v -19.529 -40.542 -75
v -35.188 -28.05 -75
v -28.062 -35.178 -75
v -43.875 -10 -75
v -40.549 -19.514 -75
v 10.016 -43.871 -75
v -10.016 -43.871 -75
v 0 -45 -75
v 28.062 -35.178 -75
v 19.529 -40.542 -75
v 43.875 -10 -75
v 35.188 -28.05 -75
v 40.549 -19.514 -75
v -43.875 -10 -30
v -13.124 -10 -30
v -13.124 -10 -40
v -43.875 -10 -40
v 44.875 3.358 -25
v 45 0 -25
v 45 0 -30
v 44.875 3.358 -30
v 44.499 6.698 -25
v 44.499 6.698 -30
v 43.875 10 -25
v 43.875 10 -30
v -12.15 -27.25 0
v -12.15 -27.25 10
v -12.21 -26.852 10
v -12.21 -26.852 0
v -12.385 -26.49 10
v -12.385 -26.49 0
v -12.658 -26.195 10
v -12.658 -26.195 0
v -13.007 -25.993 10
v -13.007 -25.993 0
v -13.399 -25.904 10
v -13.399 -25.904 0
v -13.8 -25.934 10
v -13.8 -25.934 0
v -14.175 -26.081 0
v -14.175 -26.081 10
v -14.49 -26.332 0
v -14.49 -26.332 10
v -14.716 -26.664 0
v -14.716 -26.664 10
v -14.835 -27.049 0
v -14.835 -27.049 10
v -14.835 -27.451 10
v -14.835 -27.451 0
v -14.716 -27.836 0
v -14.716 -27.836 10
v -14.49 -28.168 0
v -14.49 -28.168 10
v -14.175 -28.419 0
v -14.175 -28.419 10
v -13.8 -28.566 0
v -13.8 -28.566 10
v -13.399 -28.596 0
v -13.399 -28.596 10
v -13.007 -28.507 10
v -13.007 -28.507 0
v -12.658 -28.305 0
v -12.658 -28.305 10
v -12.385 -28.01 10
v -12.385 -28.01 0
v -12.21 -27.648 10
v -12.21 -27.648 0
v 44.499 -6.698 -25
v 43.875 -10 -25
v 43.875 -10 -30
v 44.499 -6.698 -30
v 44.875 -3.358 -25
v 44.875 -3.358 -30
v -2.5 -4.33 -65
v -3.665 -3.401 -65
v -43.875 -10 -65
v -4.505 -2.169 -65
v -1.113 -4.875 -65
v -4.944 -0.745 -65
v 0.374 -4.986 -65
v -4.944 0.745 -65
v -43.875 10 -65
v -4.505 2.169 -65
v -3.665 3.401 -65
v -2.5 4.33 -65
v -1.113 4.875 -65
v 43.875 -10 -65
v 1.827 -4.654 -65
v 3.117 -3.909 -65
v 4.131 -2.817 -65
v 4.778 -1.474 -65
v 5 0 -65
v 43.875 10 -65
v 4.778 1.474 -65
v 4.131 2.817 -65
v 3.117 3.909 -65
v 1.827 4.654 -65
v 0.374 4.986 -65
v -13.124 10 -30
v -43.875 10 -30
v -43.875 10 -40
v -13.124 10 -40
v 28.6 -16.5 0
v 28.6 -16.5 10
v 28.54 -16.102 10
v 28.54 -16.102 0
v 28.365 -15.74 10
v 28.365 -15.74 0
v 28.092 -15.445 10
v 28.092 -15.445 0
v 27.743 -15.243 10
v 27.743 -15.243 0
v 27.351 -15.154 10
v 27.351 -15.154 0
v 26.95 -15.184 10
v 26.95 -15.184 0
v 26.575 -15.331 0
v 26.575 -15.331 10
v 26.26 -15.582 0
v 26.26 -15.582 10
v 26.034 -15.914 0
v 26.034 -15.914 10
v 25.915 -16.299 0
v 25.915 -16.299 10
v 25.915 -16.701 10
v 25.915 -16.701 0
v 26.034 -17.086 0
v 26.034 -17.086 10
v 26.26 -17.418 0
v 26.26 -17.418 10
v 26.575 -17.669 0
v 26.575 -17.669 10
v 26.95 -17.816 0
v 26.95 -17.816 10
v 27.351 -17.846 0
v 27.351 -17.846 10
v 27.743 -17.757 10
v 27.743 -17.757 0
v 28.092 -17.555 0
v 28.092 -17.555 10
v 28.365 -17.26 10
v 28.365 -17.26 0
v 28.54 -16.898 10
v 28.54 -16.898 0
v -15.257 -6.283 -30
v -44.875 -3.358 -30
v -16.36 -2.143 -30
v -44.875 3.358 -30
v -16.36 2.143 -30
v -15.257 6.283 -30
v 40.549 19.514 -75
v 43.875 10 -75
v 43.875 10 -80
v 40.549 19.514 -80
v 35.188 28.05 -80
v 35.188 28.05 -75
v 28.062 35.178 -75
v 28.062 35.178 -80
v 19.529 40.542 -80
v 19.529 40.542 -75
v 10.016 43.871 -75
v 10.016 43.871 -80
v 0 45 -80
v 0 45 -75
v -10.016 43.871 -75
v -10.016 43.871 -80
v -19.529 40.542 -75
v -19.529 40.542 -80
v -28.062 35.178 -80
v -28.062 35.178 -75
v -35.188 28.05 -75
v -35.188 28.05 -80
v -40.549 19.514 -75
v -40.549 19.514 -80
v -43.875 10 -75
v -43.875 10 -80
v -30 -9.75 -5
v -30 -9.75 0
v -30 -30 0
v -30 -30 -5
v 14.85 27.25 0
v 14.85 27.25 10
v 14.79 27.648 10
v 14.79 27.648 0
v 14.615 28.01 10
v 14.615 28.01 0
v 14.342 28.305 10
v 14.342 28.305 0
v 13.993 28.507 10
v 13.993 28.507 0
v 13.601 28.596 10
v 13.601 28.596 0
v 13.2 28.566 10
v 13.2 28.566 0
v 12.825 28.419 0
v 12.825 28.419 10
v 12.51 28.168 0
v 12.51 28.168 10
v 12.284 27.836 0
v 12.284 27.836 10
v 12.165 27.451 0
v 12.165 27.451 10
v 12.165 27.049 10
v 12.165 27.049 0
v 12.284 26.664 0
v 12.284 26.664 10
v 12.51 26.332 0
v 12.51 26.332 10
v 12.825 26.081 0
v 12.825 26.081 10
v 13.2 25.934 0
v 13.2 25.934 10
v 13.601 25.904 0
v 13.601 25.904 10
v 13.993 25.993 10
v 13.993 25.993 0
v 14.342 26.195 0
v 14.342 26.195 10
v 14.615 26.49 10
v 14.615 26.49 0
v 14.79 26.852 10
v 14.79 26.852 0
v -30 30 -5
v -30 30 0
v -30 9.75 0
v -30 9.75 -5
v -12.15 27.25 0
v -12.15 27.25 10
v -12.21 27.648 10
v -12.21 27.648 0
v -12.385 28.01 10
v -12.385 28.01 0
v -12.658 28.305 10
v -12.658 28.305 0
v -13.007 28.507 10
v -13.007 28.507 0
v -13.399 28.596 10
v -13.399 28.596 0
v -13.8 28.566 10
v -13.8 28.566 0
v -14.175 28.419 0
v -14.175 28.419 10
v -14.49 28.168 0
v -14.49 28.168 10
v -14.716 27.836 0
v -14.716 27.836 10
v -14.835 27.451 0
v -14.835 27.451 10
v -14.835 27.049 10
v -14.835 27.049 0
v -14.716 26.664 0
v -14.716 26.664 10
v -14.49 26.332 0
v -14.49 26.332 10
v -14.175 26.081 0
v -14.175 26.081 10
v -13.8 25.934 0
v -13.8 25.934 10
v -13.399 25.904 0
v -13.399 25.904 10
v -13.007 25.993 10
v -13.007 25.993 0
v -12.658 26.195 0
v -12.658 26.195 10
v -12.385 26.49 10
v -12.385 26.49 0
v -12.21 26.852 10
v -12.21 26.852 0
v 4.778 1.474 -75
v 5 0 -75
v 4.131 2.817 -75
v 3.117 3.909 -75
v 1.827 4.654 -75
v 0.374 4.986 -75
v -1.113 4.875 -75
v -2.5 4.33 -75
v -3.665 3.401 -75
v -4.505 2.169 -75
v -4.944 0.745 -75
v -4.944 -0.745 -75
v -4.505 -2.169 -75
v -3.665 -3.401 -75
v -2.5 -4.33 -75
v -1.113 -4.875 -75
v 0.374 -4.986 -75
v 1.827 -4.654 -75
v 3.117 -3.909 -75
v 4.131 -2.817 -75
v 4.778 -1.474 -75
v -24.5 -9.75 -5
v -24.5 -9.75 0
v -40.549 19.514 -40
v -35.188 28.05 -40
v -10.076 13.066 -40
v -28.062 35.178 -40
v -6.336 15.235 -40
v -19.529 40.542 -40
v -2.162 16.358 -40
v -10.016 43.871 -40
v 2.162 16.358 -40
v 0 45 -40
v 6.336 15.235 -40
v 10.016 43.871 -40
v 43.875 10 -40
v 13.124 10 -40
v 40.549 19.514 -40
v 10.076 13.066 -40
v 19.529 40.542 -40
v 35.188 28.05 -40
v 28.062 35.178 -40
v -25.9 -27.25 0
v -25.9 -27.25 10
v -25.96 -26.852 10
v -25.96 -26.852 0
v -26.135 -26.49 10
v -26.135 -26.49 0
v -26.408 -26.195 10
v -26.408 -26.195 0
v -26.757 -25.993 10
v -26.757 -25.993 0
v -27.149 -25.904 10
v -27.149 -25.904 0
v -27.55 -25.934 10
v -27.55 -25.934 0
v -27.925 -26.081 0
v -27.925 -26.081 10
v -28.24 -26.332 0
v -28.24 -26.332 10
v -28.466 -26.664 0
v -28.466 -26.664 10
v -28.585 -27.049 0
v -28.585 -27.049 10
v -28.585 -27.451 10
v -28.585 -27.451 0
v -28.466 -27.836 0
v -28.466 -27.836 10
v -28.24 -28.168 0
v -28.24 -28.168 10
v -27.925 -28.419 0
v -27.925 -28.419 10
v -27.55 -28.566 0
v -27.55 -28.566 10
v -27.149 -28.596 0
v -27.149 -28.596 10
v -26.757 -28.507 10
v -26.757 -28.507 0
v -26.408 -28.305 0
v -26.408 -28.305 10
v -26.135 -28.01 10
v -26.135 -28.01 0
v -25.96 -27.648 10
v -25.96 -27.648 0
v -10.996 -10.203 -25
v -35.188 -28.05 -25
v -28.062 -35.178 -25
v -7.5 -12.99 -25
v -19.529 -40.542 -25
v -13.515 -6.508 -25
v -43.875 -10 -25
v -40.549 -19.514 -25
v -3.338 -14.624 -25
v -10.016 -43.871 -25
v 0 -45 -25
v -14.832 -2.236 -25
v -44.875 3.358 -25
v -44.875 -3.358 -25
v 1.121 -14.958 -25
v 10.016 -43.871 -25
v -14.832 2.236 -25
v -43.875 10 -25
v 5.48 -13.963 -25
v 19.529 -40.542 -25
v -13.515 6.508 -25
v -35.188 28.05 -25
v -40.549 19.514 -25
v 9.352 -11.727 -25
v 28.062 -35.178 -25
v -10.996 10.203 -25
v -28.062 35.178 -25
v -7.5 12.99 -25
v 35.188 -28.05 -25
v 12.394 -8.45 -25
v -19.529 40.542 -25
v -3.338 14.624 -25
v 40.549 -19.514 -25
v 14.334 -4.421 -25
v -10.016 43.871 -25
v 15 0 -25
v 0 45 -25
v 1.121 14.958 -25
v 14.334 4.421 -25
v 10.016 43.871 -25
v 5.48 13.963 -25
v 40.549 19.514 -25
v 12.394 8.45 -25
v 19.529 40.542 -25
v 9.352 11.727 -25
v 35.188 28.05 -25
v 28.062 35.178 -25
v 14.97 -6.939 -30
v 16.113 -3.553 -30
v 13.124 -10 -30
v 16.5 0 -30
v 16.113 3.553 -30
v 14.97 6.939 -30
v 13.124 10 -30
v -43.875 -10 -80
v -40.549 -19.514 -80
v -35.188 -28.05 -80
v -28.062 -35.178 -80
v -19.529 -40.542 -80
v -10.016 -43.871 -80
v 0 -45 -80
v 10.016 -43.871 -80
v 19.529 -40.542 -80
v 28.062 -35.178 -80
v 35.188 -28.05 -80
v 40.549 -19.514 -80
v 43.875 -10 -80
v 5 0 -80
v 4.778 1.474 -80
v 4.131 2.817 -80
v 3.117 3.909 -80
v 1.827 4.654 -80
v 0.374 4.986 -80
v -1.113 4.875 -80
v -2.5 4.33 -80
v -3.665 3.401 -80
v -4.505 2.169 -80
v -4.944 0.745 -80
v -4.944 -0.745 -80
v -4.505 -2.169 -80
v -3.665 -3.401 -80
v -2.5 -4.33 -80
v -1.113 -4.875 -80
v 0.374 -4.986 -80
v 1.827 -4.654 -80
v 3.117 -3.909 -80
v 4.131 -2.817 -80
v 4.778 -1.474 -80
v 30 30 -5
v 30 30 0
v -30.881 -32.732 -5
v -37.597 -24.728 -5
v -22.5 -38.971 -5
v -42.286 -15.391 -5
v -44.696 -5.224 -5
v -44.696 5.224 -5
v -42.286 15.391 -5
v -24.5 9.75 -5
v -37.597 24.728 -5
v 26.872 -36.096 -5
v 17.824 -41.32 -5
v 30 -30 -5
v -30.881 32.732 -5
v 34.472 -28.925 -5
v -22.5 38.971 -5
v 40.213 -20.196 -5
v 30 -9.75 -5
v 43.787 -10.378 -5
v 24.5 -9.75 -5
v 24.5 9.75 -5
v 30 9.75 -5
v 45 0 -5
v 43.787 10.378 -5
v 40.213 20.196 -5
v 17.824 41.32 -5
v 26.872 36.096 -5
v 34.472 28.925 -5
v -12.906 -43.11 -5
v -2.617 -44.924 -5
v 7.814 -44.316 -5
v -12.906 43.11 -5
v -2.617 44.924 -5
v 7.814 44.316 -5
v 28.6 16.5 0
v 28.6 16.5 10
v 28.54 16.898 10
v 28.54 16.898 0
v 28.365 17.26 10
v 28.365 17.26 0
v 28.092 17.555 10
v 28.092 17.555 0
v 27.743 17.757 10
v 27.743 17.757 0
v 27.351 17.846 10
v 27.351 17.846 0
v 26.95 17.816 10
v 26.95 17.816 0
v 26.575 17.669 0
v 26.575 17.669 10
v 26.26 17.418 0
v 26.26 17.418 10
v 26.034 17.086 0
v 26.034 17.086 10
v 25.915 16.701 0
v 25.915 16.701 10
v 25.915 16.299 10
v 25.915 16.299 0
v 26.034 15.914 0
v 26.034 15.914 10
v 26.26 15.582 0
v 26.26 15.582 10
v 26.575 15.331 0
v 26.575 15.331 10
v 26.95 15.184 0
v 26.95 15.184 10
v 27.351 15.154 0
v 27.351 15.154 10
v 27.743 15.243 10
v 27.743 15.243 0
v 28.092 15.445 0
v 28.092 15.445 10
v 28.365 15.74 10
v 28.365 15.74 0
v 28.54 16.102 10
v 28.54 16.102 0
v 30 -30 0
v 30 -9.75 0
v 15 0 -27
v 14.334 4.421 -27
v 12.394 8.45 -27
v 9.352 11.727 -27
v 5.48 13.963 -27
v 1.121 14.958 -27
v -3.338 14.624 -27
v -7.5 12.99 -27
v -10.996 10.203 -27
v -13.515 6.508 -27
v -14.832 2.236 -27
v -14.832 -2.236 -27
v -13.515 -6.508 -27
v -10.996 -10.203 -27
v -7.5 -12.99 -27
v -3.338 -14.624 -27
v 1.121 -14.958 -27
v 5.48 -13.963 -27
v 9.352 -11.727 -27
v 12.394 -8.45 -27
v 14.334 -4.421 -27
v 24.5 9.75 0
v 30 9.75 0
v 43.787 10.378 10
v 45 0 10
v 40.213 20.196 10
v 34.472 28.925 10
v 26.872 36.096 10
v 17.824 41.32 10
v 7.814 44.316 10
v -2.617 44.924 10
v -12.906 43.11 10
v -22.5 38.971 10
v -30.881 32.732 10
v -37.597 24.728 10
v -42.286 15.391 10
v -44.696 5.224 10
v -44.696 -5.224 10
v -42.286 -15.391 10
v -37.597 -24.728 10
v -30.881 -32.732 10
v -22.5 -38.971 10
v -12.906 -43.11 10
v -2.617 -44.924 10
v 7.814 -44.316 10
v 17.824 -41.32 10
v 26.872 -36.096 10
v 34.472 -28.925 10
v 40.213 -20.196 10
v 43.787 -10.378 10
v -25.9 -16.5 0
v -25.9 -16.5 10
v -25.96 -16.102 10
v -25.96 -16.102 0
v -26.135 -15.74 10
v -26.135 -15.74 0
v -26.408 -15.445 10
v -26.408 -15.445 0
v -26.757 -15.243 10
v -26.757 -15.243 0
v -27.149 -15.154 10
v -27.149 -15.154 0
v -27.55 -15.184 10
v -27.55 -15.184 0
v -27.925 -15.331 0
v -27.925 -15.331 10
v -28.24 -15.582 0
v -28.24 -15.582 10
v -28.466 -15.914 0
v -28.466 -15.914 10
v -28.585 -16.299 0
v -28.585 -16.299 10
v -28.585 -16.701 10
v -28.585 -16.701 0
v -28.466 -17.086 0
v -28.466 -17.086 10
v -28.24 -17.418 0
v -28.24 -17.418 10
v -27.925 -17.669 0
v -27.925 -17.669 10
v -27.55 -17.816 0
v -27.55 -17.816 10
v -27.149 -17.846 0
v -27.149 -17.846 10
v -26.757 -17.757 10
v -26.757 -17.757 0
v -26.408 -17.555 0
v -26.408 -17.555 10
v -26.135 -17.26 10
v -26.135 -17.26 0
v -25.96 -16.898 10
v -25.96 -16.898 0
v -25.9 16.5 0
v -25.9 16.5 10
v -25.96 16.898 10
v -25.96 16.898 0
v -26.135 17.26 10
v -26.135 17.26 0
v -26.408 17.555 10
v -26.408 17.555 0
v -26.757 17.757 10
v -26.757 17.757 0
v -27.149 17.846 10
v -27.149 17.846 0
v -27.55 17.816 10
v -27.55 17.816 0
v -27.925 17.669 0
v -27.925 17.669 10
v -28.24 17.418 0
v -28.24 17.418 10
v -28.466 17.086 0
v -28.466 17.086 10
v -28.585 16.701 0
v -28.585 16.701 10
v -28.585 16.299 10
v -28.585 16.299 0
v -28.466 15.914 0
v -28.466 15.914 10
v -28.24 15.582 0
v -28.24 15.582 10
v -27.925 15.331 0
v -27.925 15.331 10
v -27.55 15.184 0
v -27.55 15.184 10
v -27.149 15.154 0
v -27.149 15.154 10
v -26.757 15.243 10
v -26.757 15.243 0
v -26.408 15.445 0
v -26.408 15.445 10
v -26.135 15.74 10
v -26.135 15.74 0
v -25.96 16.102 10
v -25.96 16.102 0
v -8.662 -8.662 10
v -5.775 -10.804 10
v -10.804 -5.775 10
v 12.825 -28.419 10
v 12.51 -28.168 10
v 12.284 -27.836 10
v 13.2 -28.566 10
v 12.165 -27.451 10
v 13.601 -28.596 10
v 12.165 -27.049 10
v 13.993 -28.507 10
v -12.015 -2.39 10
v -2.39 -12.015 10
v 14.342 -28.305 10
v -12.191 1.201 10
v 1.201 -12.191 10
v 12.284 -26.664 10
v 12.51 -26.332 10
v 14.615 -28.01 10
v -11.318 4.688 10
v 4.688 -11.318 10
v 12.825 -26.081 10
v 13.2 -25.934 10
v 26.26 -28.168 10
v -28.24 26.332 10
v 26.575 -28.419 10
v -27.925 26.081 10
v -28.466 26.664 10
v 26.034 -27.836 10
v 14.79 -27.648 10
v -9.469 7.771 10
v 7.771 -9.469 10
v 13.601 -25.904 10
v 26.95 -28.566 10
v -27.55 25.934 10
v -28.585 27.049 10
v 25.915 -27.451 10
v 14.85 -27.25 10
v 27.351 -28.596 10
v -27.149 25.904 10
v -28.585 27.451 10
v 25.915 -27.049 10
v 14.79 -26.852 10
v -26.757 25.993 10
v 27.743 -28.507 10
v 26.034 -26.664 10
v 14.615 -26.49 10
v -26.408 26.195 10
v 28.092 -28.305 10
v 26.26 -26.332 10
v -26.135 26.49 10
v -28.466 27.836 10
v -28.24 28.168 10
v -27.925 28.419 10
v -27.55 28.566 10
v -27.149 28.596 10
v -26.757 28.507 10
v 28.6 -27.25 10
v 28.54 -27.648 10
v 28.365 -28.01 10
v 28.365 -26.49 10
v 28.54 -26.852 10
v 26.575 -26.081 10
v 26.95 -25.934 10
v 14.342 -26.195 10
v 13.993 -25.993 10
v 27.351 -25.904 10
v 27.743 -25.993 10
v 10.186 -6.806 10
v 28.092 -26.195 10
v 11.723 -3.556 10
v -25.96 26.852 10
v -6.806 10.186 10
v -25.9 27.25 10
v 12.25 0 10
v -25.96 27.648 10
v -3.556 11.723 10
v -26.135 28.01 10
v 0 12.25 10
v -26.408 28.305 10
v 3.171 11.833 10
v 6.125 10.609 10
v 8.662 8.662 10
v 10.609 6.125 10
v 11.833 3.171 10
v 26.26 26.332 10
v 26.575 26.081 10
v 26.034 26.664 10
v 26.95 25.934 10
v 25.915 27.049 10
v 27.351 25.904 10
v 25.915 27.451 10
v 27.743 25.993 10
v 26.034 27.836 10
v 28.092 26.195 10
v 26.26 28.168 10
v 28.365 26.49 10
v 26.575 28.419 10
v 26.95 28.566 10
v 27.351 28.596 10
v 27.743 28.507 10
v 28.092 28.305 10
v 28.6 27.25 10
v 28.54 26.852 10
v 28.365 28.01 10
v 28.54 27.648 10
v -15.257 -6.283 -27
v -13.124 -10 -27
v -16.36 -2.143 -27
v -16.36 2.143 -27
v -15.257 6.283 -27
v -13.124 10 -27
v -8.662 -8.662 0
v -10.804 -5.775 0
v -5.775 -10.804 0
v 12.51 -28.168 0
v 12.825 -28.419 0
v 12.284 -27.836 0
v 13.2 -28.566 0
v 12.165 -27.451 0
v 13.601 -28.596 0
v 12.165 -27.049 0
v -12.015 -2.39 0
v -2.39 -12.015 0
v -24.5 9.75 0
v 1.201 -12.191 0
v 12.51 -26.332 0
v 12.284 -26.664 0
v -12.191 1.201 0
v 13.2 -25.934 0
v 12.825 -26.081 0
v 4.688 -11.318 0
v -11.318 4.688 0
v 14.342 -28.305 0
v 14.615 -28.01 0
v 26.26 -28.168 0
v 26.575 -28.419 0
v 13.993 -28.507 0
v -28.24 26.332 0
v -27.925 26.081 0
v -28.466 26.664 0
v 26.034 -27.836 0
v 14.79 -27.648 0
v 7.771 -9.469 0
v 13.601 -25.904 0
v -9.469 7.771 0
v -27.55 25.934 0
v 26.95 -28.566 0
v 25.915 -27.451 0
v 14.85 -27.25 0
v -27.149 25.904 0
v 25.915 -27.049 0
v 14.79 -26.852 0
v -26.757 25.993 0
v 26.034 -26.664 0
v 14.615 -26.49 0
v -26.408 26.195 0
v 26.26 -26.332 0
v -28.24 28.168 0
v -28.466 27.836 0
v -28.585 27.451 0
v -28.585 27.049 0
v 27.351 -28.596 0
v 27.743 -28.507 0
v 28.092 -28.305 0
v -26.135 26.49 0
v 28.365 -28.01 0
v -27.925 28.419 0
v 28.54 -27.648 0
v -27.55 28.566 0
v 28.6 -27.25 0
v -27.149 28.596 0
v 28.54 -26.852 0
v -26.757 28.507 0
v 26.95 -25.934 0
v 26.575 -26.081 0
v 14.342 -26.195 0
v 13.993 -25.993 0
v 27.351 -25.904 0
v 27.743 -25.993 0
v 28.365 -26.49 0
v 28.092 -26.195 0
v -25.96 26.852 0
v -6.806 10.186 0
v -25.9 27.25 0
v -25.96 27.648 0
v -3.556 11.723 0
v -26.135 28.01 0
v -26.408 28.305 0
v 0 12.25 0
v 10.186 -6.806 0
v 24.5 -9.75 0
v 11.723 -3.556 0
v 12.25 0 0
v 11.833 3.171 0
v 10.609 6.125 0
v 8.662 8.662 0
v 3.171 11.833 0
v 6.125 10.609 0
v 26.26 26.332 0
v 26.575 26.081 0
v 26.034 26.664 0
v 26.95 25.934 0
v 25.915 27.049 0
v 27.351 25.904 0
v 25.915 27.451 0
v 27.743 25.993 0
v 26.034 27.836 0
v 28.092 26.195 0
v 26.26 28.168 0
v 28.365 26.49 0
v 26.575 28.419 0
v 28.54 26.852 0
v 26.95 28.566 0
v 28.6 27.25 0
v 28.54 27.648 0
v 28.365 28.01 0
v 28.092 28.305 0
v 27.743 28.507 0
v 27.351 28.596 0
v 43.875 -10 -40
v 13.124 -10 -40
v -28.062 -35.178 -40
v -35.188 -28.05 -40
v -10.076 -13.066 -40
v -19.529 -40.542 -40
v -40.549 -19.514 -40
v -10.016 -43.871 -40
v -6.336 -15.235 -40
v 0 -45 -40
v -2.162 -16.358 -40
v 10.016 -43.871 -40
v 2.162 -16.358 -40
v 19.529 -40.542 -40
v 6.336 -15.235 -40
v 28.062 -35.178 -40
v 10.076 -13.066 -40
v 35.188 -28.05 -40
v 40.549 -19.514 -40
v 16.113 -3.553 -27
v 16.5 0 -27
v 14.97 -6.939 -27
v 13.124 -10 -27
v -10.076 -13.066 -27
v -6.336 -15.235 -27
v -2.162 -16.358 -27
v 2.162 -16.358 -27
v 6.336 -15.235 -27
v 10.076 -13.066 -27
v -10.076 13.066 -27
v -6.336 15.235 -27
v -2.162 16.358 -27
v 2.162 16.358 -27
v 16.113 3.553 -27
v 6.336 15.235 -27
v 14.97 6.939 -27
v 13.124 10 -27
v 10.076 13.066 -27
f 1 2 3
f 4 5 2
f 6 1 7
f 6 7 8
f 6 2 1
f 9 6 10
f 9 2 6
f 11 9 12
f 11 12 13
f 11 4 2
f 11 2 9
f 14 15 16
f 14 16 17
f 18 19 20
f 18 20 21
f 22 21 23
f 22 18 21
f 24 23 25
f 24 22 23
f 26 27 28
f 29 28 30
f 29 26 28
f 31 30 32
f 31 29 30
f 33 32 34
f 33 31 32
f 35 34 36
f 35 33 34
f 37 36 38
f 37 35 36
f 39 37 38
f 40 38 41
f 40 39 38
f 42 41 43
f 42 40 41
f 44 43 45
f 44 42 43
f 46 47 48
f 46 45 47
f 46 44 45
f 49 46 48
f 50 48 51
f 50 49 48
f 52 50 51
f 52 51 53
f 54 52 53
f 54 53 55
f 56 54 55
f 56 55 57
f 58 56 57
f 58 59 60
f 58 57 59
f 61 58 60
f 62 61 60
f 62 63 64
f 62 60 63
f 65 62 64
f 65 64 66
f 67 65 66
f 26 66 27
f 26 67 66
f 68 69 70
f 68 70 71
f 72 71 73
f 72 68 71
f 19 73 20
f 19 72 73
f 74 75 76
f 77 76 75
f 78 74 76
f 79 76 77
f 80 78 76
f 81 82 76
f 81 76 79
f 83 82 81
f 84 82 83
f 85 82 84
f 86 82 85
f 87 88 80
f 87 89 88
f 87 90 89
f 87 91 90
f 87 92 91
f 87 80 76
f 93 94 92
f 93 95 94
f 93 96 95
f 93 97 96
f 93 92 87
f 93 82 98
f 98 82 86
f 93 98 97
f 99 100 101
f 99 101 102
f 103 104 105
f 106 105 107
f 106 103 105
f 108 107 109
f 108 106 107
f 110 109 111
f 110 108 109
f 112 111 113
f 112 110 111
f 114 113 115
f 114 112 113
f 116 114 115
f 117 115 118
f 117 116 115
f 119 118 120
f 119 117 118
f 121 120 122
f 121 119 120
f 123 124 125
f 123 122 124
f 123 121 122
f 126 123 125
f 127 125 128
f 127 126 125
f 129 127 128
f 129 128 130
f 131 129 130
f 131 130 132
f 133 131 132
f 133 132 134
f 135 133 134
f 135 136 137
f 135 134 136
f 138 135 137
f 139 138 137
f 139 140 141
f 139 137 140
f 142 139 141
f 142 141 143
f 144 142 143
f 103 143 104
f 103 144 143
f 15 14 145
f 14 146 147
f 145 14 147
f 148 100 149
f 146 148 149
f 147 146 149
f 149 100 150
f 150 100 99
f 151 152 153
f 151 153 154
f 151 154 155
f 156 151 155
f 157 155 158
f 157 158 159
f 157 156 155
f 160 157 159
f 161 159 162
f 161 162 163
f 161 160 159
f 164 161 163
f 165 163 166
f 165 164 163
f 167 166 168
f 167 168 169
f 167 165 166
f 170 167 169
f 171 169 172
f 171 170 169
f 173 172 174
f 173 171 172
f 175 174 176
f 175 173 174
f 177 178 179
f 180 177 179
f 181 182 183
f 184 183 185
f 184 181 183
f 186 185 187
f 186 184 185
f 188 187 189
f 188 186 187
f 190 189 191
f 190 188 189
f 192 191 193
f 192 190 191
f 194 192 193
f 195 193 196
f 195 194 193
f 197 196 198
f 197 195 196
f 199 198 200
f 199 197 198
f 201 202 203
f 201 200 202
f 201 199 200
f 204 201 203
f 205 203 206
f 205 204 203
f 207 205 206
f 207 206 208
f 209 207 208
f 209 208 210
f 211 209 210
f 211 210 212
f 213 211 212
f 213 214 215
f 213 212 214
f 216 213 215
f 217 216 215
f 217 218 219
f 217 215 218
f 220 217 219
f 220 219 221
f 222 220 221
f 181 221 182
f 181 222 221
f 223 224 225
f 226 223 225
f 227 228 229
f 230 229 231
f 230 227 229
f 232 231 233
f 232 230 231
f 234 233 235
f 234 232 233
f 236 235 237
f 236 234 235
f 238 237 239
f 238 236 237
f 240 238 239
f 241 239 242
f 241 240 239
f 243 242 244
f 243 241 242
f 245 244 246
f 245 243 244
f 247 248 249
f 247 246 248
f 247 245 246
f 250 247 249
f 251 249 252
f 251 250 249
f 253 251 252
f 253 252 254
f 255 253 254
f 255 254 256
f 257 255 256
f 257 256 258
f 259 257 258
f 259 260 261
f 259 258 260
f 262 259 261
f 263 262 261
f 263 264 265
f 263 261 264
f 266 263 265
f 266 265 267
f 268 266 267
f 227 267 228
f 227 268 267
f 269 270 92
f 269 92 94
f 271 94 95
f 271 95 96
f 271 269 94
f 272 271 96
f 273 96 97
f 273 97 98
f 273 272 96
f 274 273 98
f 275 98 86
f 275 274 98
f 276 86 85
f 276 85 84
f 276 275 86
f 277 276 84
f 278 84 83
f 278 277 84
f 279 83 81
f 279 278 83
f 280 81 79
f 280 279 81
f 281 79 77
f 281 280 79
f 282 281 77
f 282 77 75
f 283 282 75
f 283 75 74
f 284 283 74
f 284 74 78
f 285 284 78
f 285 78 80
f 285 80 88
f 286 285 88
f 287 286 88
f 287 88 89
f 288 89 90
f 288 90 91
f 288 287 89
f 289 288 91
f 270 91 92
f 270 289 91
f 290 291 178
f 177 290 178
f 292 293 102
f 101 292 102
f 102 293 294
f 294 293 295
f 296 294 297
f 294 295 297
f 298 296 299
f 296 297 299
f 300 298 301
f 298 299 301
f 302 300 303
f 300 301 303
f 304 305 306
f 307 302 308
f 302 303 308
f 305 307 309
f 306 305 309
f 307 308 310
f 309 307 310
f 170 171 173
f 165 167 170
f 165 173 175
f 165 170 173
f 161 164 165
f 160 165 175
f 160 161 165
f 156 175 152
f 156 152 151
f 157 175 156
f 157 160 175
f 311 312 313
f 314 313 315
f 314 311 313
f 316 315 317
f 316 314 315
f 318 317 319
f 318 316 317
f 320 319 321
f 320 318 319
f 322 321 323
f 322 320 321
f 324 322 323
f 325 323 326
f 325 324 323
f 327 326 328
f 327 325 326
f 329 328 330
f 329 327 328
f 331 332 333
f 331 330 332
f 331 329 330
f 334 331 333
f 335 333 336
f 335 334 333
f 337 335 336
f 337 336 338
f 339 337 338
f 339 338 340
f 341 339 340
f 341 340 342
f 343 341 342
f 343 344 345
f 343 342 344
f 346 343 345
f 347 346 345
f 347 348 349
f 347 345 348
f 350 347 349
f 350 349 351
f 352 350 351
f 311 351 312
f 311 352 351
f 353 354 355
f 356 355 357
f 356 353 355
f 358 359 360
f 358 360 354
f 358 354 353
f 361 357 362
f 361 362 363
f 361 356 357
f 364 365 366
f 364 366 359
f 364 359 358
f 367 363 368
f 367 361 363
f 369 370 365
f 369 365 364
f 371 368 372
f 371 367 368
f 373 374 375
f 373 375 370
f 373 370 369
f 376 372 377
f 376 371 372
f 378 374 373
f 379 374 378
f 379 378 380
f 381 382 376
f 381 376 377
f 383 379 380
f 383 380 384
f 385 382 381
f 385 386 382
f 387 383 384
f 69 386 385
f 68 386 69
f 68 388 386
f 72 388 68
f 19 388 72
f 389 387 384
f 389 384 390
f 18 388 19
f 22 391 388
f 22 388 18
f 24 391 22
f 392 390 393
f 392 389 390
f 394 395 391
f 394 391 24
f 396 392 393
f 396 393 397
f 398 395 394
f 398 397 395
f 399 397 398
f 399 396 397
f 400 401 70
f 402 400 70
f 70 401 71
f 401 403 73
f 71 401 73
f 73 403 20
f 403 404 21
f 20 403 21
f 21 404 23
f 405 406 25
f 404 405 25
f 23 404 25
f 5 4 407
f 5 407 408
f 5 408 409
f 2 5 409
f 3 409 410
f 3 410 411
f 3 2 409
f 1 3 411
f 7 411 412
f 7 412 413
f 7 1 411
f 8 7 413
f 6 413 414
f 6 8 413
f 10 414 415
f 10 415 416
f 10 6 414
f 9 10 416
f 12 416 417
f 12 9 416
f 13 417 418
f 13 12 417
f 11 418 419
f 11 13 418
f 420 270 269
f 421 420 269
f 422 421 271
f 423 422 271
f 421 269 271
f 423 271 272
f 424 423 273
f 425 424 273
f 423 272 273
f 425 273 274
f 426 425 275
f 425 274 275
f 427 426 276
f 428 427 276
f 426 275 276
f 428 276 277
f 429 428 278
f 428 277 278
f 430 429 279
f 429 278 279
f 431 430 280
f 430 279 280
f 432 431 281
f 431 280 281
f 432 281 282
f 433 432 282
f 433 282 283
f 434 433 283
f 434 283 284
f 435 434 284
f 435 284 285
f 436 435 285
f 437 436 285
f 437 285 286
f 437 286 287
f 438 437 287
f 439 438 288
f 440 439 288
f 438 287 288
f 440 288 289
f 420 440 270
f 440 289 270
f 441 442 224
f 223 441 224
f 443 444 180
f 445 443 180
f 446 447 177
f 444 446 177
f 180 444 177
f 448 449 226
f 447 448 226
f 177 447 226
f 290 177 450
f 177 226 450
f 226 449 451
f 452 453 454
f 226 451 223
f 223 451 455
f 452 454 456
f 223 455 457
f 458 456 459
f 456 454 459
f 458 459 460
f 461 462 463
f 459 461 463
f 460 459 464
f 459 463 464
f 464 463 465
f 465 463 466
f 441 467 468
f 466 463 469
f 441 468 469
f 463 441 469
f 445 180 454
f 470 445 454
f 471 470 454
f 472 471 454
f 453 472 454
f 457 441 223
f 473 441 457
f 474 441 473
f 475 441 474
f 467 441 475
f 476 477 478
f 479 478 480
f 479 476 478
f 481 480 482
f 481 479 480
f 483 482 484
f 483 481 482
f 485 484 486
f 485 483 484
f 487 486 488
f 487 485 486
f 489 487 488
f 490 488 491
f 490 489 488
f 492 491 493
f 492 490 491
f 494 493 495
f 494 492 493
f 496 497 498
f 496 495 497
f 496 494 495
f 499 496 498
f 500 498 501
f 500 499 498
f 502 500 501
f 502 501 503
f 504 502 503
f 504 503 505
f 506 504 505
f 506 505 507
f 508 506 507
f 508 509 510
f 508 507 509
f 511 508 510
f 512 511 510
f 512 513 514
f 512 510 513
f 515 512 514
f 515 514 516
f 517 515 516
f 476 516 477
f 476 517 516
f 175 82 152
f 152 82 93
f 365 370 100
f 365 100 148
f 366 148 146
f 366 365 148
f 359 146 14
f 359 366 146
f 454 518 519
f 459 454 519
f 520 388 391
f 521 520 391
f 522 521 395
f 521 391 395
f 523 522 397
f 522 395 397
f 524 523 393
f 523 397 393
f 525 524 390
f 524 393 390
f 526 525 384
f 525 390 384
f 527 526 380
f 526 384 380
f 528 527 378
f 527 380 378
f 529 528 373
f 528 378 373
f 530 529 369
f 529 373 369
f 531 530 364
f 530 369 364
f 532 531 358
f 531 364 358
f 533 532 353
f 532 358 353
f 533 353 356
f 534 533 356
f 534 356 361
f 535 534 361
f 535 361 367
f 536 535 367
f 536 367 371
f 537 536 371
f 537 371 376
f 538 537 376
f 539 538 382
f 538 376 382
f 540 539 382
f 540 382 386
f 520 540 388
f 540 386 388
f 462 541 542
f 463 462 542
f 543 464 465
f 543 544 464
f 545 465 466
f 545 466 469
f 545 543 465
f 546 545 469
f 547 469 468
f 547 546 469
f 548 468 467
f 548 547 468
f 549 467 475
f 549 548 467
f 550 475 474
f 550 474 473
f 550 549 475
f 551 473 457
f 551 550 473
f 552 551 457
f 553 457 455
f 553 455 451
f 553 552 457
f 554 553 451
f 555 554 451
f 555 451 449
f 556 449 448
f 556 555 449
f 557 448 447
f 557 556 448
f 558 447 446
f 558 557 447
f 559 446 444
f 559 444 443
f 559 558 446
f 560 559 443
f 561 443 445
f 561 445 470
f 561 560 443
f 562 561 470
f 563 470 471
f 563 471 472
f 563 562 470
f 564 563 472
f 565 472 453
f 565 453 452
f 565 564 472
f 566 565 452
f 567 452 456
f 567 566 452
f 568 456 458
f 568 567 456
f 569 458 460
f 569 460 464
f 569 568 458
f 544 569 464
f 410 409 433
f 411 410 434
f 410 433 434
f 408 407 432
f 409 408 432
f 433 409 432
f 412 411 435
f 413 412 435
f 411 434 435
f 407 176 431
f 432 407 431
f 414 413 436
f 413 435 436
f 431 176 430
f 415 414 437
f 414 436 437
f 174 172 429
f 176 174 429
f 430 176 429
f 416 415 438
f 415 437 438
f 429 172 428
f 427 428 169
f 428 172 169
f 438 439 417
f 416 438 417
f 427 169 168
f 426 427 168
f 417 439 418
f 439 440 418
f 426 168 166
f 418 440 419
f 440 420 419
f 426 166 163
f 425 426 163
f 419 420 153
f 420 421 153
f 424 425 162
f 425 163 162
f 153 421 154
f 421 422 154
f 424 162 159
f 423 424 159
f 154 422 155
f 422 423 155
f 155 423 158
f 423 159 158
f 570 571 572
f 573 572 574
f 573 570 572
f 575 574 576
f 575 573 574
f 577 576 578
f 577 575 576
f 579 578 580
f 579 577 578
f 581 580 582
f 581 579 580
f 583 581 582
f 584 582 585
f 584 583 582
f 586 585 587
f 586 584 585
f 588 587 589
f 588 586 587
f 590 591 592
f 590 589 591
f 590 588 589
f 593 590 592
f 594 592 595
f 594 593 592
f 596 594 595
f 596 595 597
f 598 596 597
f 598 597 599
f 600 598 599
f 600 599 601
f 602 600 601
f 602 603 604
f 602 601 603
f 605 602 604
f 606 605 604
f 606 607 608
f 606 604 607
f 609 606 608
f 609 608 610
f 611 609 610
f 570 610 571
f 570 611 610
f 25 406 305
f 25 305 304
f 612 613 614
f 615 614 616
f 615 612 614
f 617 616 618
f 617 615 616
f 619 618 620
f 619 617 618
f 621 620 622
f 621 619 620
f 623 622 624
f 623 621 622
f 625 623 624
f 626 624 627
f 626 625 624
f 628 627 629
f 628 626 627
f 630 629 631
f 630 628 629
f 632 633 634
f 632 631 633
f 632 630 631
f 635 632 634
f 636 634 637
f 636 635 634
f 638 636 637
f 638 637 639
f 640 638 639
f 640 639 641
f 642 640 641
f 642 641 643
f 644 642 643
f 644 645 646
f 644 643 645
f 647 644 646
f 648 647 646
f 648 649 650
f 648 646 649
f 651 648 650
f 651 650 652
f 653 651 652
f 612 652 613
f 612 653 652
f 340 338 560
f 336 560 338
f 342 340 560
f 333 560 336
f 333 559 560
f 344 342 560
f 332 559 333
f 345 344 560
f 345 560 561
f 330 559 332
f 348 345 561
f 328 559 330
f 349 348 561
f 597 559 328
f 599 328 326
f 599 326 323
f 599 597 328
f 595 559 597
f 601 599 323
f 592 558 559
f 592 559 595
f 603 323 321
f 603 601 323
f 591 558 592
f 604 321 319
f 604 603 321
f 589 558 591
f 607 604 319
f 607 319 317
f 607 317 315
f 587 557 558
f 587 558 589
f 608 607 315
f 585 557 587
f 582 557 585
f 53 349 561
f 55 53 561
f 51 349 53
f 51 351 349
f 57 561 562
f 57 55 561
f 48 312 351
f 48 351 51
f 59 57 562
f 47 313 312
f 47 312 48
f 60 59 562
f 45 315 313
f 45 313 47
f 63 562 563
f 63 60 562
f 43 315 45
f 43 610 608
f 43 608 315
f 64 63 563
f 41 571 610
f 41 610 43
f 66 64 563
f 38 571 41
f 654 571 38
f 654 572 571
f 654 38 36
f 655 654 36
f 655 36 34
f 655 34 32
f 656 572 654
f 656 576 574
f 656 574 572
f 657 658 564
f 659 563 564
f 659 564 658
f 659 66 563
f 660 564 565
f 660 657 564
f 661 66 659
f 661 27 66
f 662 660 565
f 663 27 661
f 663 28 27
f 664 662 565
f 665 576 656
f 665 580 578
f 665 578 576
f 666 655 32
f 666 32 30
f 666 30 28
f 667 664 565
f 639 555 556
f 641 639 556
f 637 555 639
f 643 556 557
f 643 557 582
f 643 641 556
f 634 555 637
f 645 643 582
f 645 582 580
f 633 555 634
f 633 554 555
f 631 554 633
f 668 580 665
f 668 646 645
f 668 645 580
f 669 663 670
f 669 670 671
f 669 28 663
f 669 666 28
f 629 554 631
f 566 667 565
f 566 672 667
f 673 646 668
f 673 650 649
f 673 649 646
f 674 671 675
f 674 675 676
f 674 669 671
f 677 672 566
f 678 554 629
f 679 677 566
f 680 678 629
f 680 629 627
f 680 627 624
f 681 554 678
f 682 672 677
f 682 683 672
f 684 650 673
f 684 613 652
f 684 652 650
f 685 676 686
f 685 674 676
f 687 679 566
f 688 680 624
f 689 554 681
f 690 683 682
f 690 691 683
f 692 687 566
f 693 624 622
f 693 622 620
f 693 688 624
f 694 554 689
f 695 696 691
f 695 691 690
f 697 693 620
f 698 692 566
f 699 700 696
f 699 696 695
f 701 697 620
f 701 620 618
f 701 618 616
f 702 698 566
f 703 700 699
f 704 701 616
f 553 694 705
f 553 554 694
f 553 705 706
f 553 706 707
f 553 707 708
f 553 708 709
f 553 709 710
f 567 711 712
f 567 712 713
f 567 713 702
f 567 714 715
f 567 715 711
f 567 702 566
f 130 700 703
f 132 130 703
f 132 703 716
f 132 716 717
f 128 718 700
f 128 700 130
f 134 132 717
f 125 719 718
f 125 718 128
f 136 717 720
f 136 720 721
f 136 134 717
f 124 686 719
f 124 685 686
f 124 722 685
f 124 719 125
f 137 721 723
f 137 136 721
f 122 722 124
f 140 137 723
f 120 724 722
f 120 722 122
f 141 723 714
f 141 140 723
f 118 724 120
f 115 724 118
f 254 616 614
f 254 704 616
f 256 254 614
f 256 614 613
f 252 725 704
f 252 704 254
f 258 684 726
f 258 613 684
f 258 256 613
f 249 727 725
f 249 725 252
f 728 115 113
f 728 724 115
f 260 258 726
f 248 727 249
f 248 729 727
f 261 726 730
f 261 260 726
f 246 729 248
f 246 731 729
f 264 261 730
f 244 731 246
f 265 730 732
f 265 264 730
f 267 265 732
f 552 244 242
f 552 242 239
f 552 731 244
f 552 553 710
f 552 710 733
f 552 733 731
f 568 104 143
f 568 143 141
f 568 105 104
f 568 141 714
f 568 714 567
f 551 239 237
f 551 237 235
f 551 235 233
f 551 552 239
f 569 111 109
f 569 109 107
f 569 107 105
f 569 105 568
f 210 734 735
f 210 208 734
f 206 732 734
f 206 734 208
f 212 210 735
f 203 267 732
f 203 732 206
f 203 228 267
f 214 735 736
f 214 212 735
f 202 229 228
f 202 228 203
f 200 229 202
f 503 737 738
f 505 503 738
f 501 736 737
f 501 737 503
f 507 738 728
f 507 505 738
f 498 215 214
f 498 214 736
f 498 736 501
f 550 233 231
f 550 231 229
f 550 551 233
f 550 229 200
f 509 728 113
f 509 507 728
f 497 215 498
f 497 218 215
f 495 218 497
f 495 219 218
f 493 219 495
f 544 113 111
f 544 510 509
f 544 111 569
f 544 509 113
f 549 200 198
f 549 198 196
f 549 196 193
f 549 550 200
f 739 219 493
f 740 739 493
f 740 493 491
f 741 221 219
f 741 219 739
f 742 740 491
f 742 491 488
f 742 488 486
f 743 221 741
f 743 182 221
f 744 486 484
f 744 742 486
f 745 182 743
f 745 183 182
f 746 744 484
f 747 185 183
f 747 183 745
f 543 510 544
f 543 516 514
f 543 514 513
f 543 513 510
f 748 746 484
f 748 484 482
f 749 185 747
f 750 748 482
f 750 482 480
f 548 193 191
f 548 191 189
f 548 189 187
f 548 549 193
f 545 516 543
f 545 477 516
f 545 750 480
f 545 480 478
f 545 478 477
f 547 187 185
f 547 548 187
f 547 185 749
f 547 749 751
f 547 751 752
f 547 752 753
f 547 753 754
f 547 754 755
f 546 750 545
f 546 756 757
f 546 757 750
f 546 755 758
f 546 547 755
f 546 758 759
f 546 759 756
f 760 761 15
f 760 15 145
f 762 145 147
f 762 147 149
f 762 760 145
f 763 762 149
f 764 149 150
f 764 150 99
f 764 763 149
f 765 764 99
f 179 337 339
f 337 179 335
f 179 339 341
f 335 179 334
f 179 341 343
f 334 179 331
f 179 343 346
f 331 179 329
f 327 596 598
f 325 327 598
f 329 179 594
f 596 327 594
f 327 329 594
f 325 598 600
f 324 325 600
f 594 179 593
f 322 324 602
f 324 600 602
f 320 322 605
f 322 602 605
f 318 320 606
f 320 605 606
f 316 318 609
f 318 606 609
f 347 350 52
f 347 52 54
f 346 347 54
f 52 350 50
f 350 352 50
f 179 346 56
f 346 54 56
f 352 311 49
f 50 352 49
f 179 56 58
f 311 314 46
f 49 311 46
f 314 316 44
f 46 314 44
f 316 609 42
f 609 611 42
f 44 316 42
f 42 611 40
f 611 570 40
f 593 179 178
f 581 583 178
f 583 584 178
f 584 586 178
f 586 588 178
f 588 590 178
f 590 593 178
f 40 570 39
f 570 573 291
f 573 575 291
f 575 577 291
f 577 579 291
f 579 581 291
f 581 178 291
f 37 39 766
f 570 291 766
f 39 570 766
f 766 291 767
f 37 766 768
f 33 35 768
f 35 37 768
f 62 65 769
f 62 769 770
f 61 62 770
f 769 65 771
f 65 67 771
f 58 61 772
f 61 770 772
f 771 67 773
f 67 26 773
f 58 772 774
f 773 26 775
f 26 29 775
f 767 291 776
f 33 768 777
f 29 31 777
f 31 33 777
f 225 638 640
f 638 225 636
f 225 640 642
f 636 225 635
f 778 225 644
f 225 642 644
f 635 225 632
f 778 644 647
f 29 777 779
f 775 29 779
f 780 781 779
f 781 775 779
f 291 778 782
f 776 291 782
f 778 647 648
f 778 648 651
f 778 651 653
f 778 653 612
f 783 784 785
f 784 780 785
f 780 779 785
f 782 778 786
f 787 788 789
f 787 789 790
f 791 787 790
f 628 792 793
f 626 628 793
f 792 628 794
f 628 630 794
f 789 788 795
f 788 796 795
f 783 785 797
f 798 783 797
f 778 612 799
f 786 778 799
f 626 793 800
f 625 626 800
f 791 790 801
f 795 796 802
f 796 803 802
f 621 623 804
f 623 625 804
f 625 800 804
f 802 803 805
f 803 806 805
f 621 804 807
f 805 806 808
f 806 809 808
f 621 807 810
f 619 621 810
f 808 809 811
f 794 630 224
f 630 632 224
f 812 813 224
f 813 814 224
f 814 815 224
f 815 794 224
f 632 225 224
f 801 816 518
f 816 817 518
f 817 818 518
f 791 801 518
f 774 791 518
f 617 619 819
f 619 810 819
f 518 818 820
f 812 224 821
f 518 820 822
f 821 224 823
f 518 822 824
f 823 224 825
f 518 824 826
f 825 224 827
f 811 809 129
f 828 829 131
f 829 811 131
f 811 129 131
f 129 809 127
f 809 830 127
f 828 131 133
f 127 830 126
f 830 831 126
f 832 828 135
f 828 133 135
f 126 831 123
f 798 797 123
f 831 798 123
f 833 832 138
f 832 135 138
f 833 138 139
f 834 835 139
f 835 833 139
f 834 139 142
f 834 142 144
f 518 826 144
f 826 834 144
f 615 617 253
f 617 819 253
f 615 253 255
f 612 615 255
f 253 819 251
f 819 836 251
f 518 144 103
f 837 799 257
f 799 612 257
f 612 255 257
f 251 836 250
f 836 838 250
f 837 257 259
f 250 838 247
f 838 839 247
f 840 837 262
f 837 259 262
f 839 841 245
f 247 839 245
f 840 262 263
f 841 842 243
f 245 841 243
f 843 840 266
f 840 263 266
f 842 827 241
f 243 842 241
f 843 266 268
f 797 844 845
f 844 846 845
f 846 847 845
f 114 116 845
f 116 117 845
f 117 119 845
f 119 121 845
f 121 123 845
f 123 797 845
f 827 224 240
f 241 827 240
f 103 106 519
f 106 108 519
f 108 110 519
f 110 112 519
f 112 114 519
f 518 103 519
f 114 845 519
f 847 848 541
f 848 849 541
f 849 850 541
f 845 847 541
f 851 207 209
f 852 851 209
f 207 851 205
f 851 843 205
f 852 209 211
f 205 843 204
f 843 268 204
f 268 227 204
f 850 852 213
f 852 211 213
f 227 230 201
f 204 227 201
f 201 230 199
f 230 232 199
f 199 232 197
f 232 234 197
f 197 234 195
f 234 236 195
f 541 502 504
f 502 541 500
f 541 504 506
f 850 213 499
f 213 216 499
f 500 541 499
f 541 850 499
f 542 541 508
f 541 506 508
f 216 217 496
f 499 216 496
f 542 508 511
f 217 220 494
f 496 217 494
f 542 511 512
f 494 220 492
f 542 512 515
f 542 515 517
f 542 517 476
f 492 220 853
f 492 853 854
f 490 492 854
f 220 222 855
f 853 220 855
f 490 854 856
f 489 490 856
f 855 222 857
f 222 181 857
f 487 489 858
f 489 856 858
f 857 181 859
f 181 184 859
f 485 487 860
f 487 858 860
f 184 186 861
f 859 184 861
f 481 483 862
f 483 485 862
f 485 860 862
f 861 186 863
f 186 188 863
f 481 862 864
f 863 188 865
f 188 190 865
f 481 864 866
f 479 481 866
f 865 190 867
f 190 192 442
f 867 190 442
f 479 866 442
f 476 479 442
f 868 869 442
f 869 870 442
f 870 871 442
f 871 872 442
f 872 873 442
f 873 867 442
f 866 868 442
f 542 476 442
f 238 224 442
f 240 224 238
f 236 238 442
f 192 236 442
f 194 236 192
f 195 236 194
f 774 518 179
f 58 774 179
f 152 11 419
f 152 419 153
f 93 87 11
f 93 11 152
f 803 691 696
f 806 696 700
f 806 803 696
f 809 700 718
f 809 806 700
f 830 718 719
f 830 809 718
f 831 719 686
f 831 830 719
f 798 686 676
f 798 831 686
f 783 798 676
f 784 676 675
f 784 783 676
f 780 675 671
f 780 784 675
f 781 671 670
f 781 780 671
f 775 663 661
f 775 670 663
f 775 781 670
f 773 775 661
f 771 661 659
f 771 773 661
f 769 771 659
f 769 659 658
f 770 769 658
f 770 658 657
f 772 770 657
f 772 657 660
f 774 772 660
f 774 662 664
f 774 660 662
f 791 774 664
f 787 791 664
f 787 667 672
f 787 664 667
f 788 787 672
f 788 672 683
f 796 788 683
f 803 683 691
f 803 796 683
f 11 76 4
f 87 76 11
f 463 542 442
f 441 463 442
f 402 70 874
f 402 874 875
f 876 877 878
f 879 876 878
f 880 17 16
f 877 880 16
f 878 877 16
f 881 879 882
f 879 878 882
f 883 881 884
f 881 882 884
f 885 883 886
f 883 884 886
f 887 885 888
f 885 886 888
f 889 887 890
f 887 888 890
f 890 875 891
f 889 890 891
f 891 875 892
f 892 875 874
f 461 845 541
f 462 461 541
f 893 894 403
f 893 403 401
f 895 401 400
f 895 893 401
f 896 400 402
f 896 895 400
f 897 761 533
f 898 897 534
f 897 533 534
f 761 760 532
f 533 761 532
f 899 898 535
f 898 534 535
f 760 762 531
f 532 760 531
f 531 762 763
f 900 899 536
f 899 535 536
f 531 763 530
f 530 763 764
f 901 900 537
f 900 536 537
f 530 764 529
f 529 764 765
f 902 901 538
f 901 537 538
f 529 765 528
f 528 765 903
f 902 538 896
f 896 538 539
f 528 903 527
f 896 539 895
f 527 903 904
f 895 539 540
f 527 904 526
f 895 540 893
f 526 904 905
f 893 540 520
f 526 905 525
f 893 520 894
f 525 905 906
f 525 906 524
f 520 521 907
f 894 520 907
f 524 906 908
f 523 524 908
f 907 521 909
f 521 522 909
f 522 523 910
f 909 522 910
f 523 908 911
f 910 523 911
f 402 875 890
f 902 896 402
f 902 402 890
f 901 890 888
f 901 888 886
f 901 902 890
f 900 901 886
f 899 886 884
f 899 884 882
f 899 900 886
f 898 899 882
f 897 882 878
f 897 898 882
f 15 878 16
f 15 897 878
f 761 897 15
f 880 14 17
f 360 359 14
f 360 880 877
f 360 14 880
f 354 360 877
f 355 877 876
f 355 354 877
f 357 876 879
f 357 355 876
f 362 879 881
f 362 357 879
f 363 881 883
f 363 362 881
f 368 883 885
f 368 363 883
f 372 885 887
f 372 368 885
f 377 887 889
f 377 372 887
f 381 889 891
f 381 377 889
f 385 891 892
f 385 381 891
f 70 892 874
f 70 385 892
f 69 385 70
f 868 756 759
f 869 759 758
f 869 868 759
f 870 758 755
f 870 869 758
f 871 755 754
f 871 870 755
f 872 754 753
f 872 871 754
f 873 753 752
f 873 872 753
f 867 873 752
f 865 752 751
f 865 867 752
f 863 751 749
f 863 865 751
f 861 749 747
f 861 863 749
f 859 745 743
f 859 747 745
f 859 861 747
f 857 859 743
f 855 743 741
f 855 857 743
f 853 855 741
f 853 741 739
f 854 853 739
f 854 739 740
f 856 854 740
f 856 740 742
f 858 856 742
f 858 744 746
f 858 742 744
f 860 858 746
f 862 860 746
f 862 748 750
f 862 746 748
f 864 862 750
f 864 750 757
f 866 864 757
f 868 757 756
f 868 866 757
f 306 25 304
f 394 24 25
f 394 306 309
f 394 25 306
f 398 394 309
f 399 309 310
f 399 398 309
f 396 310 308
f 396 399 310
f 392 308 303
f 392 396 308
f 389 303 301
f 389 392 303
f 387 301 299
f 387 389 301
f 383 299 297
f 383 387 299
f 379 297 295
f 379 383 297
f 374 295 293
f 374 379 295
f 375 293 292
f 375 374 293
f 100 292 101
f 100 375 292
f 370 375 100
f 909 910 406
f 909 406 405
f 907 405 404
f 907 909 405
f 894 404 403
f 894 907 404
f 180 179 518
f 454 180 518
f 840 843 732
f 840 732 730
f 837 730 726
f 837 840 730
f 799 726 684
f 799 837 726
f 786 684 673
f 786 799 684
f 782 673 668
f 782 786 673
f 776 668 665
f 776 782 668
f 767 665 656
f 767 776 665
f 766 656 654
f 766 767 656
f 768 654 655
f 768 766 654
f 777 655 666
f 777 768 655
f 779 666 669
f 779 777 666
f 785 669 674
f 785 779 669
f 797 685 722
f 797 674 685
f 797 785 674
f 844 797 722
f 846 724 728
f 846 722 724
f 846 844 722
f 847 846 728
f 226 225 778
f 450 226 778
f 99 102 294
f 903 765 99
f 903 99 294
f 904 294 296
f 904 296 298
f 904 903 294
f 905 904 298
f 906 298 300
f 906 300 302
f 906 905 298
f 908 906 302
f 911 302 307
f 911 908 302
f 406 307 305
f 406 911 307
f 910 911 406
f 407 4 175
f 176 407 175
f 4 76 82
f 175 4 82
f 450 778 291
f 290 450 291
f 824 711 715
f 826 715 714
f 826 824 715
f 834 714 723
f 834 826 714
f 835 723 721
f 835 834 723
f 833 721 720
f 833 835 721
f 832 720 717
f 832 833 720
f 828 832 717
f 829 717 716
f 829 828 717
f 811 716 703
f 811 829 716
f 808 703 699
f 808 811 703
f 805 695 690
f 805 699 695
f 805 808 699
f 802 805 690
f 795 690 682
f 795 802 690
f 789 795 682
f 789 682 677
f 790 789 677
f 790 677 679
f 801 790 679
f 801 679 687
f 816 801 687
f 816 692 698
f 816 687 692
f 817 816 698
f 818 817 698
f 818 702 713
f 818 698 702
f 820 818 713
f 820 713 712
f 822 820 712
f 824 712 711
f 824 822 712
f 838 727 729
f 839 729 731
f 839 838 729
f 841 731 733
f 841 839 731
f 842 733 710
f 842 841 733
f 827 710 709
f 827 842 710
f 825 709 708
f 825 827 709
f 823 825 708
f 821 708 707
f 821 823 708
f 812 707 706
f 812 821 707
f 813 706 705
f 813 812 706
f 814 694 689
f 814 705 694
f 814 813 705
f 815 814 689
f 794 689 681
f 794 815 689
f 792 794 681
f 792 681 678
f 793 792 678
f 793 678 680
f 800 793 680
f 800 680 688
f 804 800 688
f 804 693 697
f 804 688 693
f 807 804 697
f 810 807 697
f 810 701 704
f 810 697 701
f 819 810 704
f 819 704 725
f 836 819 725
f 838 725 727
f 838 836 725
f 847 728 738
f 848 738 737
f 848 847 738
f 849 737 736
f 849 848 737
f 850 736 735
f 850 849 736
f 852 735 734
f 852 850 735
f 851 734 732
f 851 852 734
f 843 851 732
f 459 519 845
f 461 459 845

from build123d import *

# Parameters (mm, degrees)
F1_R           = 45
F2_DEPTH       = 10
F2_DEPTH_BACK  = 5
F0_R           = 1.35
F3_DEPTH       = 5
F4_DEPTH       = 5.001
F4_DEPTH_BACK  = 10.001
F6_R           = 15
F7_DEPTH       = 2
F8_DEPTH       = 5
F9_DEPTH       = 15
F11_W          = 87.7496438739
F11_H          = 20
F11_R          = 5
F12_DEPTH      = 10
F12_DEPTH_BACK = 5
F13_DEPTH      = 5


with BuildPart() as f2:
    # F1 (on Top) → F2 (new body, two sides)
    with BuildSketch(Plane.XY) as f2_sk:
        Circle(F1_R)
    extrude(amount=F2_DEPTH)
    extrude(f2_sk.sketch, amount=-F2_DEPTH_BACK)

    # F0 (on Top) → F3 (cut, through all)
    with BuildSketch(Plane.XY):
        Polygon((24.5, 24.5), (24.5, 9.75), (30, 9.75), (30, 30), (0, 30), (0, 24.5), align=None)
        with Locations((13.5, 27.25)):
            Circle(F0_R, mode=Mode.SUBTRACT)
        with Locations((27.25, 16.5)):
            Circle(F0_R, mode=Mode.SUBTRACT)
        with Locations((27.25, 27.25)):
            Circle(F0_R, mode=Mode.SUBTRACT)
        with BuildLine():
            ThreePointArc((0, 12.25), (8.6620580695, 8.6620580695), (12.25, 0))
            Line((12.25, 0), (24.5, 0))
            Line((24.5, 0), (24.5, 9.75))
            Line((24.5, 9.75), (24.5, 24.5))
            Line((24.5, 24.5), (0, 24.5))
            Line((0, 24.5), (0, 12.25))
        make_face()
        with BuildLine():
            Line((24.5, 0), (12.25, 0))
            ThreePointArc((12.25, 0), (-8.6620580695, -8.6620580695), (0, 12.25))
            Line((0, 12.25), (0, 24.5))
            Line((0, 24.5), (-24.5, 24.5))
            Line((-24.5, 24.5), (-24.5, 9.75))
            Line((-24.5, 9.75), (-24.5, 0))
            Line((-24.5, 0), (-24.5, -9.75))
            Line((-24.5, -9.75), (-24.5, -24.5))
            Line((-24.5, -24.5), (0, -24.5))
            Line((0, -24.5), (24.5, -24.5))
            Line((24.5, -24.5), (24.5, -9.75))
            Line((24.5, -9.75), (24.5, 0))
        make_face()
        Polygon((30, -9.75), (24.5, -9.75), (24.5, -24.5), (0, -24.5), (0, -30), (30, -30), align=None)
        with Locations((13.5, -27.25)):
            Circle(F0_R, mode=Mode.SUBTRACT)
        with Locations((27.25, -27.25)):
            Circle(F0_R, mode=Mode.SUBTRACT)
        with Locations((27.25, -16.5)):
            Circle(F0_R, mode=Mode.SUBTRACT)
        Polygon((0, -30), (0, -24.5), (-24.5, -24.5), (-24.5, -9.75), (-30, -9.75), (-30, -30), align=None)
        with Locations((-27.25, -27.25)):
            Circle(F0_R, mode=Mode.SUBTRACT)
        with Locations((-27.25, -16.5)):
            Circle(F0_R, mode=Mode.SUBTRACT)
        with Locations((-13.5, -27.25)):
            Circle(F0_R, mode=Mode.SUBTRACT)
        Polygon((-24.5, 24.5), (0, 24.5), (0, 30), (-30, 30), (-30, 9.75), (-24.5, 9.75), align=None)
        with Locations((-27.25, 16.5)):
            Circle(F0_R, mode=Mode.SUBTRACT)
        with Locations((-27.25, 27.25)):
            Circle(F0_R, mode=Mode.SUBTRACT)
        with Locations((-13.5, 27.25)):
            Circle(F0_R, mode=Mode.SUBTRACT)
    extrude(amount=-F3_DEPTH, mode=Mode.SUBTRACT)

    # F0 (on Top) → F4 (cut, two sides)
    with BuildSketch(Plane.XY) as f4_sk:
        with Locations((27.25, -27.25)):
            Circle(F0_R)
        with Locations((27.25, -16.5)):
            Circle(F0_R)
        with BuildLine():
            ThreePointArc((0, 12.25), (-8.6620580695, -8.6620580695), (12.25, 0))
            ThreePointArc((12.25, 0), (8.6620580695, 8.6620580695), (0, 12.25))
        make_face()
        with Locations((27.25, 16.5)):
            Circle(F0_R)
        with Locations((27.25, 27.25)):
            Circle(F0_R)
        with Locations((13.5, -27.25)):
            Circle(F0_R)
        with Locations((13.5, 27.25)):
            Circle(F0_R)
        with Locations((-27.25, -16.5)):
            Circle(F0_R)
        with Locations((-27.25, -27.25)):
            Circle(F0_R)
        with Locations((-13.5, -27.25)):
            Circle(F0_R)
        with Locations((-27.25, 16.5)):
            Circle(F0_R)
        with Locations((-27.25, 27.25)):
            Circle(F0_R)
        with Locations((-13.5, 27.25)):
            Circle(F0_R)
    extrude(amount=-F4_DEPTH, mode=Mode.SUBTRACT)
    extrude(f4_sk.sketch, amount=F4_DEPTH_BACK, mode=Mode.SUBTRACT)


with BuildPart() as f7:
    # F6 (on offset) → F7 (new body)
    with BuildSketch(Plane.XY.offset(-25)):
        with BuildLine():
            ThreePointArc((13.1244047484, -10), (15.6333406275, -5.2771830389), (16.5, 0))
            ThreePointArc((16.5, 0), (15.6333406275, 5.2771830389), (13.1244047484, 10))
            ThreePointArc((13.1244047484, 10), (0, 16.5), (-13.1244047484, 10))
            ThreePointArc((-13.1244047484, 10), (-16.5, 0), (-13.1244047484, -10))
            ThreePointArc((-13.1244047484, -10), (0, -16.5), (13.1244047484, -10))
        make_face()
        Circle(F6_R, mode=Mode.SUBTRACT)
    extrude(amount=-F7_DEPTH)

    # F6 (on offset) → F8 (join)
    with BuildSketch(Plane.XY.offset(-25)):
        with BuildLine():
            ThreePointArc((13.1244047484, 10), (15.6333406275, 5.2771830389), (16.5, 0))
            ThreePointArc((16.5, 0), (15.6333406275, -5.2771830389), (13.1244047484, -10))
            Line((13.1244047484, -10), (43.874821937, -10))
            ThreePointArc((43.874821937, -10), (44.7178207606, -5.0315510947), (45, 0))
            ThreePointArc((45, 0), (44.7178207606, 5.0315510947), (43.874821937, 10))
            Line((43.874821937, 10), (13.1244047484, 10))
        make_face()
        with BuildLine():
            ThreePointArc((-13.1244047484, -10), (-16.5, 0), (-13.1244047484, 10))
            Line((-13.1244047484, 10), (-43.874821937, 10))
            ThreePointArc((-43.874821937, 10), (-45, 0), (-43.874821937, -10))
            Line((-43.874821937, -10), (-13.1244047484, -10))
        make_face()
    extrude(amount=-F8_DEPTH)

    # F6 (on offset) → F9 (join)
    with BuildSketch(Plane.XY.offset(-25)):
        with BuildLine():
            ThreePointArc((-13.1244047484, 10), (0, 16.5), (13.1244047484, 10))
            Line((13.1244047484, 10), (43.874821937, 10))
            ThreePointArc((43.874821937, 10), (0, 45), (-43.874821937, 10))
            Line((-43.874821937, 10), (-13.1244047484, 10))
        make_face()
        with BuildLine():
            Line((43.874821937, -10), (13.1244047484, -10))
            ThreePointArc((13.1244047484, -10), (0, -16.5), (-13.1244047484, -10))
            Line((-13.1244047484, -10), (-43.874821937, -10))
            ThreePointArc((-43.874821937, -10), (0, -45), (43.874821937, -10))
        make_face()
    extrude(amount=-F9_DEPTH)


with BuildPart() as f12:
    # F11 (on offset) → F12 (new body, two sides)
    with BuildSketch(Plane.XY.offset(-75)) as f12_sk:
        Rectangle(F11_W, F11_H)
        Circle(F11_R, mode=Mode.SUBTRACT)
    extrude(amount=F12_DEPTH)
    extrude(f12_sk.sketch, amount=-F12_DEPTH_BACK)

    # F11 (on offset) → F13 (join)
    with BuildSketch(Plane.XY.offset(-75)):
        with BuildLine():
            Line((-43.874821937, 10), (43.874821937, 10))
            ThreePointArc((43.874821937, 10), (0, 45), (-43.874821937, 10))
        make_face()
        with BuildLine():
            ThreePointArc((-43.874821937, -10), (0, -45), (43.874821937, -10))
            Line((43.874821937, -10), (-43.874821937, -10))
        make_face()
    extrude(amount=-F13_DEPTH)


solid = Compound([f2.part, f7.part, f12.part])
